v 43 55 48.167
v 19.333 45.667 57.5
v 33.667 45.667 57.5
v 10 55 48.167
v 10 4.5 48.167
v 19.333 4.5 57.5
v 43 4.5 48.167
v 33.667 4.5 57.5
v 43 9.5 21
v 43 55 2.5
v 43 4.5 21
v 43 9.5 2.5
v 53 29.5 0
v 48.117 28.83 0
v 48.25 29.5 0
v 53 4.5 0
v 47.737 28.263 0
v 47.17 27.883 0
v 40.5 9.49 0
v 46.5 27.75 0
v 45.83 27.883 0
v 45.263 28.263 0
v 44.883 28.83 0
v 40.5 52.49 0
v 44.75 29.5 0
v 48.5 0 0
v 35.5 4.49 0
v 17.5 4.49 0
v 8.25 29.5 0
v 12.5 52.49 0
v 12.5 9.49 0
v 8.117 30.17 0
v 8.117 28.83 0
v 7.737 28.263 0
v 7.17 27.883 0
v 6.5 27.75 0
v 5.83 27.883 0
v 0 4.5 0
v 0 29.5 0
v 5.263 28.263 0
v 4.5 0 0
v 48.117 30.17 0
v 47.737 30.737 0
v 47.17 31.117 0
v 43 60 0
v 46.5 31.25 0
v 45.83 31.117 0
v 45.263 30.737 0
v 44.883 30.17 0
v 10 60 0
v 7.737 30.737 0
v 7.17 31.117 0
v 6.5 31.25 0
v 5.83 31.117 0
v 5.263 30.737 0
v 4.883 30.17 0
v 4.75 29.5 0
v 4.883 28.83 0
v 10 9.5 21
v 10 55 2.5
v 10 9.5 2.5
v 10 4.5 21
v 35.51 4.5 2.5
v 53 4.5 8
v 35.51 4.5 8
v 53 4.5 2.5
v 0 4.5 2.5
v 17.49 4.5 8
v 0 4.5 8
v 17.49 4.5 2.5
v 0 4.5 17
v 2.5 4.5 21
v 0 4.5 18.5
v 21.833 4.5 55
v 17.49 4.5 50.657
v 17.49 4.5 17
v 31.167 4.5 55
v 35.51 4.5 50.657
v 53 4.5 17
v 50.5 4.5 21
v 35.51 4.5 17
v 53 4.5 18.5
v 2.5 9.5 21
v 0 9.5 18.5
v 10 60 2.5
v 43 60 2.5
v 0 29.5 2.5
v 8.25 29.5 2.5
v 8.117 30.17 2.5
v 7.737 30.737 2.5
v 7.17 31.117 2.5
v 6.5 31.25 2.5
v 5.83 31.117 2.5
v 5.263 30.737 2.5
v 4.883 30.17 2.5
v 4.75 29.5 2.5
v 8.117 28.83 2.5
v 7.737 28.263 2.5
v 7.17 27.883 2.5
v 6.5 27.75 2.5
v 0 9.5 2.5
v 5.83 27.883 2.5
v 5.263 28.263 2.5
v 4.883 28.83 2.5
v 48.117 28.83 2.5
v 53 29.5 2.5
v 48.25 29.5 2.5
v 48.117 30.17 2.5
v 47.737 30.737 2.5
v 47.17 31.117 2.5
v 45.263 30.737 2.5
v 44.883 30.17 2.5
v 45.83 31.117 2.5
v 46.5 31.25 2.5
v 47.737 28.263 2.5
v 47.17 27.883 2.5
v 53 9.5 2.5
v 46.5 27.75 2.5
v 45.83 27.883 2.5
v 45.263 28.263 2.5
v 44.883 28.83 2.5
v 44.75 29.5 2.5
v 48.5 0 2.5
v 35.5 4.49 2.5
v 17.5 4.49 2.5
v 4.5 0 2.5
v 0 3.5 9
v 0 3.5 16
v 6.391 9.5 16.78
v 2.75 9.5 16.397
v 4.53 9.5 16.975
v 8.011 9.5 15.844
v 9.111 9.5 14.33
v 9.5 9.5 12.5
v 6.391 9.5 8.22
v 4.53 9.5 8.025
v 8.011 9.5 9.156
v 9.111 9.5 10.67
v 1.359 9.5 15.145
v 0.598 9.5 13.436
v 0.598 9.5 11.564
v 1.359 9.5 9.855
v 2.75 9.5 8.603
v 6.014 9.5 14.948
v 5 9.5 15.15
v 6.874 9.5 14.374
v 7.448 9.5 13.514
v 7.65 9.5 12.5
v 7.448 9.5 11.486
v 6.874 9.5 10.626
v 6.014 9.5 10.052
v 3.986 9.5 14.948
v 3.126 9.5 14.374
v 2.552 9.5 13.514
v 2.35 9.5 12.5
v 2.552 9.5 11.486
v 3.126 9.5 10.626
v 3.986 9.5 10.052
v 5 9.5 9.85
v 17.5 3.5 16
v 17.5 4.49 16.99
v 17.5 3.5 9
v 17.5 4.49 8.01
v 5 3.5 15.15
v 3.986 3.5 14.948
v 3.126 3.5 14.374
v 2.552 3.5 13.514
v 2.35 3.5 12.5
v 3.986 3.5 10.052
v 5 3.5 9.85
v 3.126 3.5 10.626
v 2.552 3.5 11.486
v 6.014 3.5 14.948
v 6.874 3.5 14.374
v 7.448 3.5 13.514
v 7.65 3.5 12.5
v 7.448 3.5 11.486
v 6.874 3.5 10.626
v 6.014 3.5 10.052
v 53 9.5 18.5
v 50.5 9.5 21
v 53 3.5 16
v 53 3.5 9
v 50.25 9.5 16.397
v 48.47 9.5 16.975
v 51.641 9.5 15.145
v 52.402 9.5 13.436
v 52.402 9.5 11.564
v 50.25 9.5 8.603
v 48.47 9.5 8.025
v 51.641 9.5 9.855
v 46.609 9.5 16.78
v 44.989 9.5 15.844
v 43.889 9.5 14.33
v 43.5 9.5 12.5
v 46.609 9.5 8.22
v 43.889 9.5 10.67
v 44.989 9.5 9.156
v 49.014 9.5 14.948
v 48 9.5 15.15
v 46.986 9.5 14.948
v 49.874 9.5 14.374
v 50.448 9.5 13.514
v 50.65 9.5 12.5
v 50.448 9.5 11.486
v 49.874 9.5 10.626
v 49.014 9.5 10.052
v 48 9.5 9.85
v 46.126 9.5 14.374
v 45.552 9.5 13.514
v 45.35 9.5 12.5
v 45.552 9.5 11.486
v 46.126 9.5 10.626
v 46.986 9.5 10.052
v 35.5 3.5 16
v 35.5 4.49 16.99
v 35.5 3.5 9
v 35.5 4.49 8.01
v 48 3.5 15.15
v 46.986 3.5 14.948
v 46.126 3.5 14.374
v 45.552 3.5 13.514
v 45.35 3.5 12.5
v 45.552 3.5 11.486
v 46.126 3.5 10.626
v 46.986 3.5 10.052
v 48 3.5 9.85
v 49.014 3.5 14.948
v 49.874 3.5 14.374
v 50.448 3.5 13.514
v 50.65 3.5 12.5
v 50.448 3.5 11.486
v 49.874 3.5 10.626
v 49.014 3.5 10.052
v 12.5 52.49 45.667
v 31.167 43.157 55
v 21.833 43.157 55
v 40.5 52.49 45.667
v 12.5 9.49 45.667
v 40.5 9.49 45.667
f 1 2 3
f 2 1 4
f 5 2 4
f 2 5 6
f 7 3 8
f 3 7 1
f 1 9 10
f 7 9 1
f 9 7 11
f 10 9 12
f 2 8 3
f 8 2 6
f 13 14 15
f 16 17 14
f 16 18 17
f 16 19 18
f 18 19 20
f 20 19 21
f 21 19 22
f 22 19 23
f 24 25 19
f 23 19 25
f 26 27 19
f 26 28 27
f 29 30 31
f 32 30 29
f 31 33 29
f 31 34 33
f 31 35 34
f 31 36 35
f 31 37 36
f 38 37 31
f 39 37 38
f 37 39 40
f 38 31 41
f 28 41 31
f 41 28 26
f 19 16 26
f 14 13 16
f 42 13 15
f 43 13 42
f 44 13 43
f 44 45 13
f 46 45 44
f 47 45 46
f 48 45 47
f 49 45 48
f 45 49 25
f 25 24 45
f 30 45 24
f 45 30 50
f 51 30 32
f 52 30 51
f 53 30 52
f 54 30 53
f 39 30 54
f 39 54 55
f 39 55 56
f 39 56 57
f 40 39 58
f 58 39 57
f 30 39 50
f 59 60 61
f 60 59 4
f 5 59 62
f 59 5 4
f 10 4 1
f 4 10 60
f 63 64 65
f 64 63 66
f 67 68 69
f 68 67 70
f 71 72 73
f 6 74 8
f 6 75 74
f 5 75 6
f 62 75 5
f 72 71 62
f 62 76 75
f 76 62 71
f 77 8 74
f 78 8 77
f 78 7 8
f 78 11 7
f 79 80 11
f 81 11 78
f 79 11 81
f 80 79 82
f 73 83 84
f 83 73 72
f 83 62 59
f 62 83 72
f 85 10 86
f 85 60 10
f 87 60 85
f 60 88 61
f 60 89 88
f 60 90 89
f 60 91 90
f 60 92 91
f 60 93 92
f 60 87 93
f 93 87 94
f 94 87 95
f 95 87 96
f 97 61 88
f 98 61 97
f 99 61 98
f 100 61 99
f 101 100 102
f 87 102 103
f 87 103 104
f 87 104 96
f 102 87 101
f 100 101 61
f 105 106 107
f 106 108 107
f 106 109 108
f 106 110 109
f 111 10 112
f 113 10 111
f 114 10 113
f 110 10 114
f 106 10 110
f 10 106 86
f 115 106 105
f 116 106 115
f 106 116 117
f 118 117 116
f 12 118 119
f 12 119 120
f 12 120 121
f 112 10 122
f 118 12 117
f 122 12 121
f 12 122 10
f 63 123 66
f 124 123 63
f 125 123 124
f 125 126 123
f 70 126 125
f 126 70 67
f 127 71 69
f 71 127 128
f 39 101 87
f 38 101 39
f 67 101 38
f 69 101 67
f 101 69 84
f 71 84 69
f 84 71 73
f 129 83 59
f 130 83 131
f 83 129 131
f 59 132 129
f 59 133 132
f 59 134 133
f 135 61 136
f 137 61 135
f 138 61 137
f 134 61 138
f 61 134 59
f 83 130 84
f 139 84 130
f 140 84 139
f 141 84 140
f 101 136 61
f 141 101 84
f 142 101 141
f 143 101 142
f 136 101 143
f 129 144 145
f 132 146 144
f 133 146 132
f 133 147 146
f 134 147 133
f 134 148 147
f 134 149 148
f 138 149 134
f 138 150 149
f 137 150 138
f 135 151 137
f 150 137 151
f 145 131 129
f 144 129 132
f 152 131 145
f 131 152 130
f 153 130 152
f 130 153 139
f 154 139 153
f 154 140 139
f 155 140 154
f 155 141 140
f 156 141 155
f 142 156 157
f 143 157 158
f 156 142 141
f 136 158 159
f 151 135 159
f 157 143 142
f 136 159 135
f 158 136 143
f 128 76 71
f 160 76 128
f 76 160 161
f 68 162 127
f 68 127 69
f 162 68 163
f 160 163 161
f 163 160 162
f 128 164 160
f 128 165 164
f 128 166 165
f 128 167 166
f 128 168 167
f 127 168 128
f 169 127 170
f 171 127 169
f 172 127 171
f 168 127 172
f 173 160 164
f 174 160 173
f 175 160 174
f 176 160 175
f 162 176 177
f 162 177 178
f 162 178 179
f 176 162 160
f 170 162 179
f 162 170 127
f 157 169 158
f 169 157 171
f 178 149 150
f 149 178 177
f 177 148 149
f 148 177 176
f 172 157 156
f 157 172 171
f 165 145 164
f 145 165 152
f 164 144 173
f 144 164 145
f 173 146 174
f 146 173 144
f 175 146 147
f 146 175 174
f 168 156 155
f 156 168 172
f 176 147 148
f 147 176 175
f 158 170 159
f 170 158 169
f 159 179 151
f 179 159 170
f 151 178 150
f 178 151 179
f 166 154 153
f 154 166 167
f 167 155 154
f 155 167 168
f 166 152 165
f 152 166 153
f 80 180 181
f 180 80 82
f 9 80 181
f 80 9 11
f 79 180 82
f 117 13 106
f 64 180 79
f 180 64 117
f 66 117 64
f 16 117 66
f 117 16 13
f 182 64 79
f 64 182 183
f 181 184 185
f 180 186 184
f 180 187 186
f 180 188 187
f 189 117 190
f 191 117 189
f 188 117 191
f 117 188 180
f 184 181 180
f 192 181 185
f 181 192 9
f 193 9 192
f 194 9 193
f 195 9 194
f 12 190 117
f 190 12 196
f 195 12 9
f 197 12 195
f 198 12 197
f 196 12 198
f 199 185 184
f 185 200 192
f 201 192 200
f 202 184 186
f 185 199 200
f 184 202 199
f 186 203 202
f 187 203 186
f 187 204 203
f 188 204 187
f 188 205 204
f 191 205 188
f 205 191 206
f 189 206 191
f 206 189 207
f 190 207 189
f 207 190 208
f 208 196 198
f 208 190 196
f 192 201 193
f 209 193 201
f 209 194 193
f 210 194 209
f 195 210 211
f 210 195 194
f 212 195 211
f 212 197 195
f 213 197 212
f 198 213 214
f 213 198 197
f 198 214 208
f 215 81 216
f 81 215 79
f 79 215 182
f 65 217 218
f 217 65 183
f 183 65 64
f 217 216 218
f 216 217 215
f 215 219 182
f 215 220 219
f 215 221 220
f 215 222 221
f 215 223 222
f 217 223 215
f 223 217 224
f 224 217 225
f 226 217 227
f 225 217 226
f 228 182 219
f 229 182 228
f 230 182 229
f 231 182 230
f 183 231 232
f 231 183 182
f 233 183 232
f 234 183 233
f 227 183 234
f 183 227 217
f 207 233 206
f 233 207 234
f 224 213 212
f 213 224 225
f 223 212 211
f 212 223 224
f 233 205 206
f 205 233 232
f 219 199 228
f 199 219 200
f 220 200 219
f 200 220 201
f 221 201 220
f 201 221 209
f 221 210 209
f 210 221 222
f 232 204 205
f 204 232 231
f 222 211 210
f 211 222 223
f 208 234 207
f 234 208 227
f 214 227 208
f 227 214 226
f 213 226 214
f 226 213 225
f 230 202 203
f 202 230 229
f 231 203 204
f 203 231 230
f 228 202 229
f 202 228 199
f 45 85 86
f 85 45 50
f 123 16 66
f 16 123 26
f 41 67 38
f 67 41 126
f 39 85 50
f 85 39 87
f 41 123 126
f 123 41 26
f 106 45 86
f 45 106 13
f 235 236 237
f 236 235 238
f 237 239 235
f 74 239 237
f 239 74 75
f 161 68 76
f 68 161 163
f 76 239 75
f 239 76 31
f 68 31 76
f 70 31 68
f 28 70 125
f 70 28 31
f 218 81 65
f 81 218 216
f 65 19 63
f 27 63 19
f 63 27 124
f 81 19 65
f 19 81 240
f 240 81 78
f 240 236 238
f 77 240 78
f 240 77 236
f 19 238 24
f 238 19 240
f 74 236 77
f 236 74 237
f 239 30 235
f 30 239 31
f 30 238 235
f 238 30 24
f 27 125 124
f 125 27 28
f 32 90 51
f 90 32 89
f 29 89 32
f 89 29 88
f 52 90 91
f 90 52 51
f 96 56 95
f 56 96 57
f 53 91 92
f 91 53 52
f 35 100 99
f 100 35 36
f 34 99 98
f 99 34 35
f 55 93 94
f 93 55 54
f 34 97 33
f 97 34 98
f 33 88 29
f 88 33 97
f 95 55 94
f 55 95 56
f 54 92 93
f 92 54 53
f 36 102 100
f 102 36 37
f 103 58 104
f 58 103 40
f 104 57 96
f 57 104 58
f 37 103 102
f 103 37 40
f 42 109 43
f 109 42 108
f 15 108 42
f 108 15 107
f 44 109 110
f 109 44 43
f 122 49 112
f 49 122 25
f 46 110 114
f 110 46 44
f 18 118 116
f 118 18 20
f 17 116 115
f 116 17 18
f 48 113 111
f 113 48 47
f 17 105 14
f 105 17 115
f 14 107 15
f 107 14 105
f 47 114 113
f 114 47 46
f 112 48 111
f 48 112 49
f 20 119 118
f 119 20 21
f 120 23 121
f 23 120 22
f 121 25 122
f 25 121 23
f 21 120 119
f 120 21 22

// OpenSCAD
// preview[view:northeast, tilt:topdiagonal]

/* [Basic] */
// Thickness of walls
t=2.5;
// extra space behind the plug for wires
sock_ex_h=34;   

// Aluminum extrusion
ae=20;

// Placement of cutout for wires
mirror=0;

/* [Advanced] */
sock_w=28;
sock_d=48;
sock_h=21;
// extra faceplate on bottom
sock_ex_b=4.5;
// extra faceplate on top
sock_ex_t=7.5;
sock_fillet=5;

// Overall width
f_w=48+2*t;

/* [Hidden] */
f_d=sock_d+sock_ex_b+sock_ex_t;
f_corner=(f_w-sock_w-2*t)/2;

e=0.01;

power_plug();

module mount_screw() {
  // screw hole
  translate([0,0,-e]) cylinder(2*t+2*e, d=3.5, $fn=16);
  // nut clearout
  translate([0,0,t+e]) rotate(30) cylinder(sock_h+sock_ex_h+2*t+2*e, d=7, $fn=6);
}

module mount_ear() {
  w=f_corner;
  tt=5;
  
  difference() {
    union() {
      cube_fillet([w,tt,ae-t+1], top=[0,2.5]);
      translate([0,-1,(ae-9)/2])
        cube_fillet([w+sock_fillet+t,1,9], bottom=[0,0,1], top=[0,0,1]);
    }
    // M5 screw
    translate([w/2,0,ae/2]) rotate([-90]) {
      translate([0,0,-1-e]) cylinder(tt+1+2*e, d=5.3, $fn=16);
      // screw cap
      translate([0,0,5]) cylinder(tt-5+2*e, d=9);
    }
  }
}

module power_plug() {
difference() {
  union() {
    // faceplate
    linear_extrude(height=t) polygon([
      [0,sock_ex_b], [sock_ex_b,0], [f_w-sock_ex_b,0], [f_w,sock_ex_b],
      [f_w,sock_ex_b+25], [f_w-f_corner,f_d], [f_corner,f_d],
      [0,sock_ex_b+25]
    ]);
    // sock body
    translate([f_corner,sock_ex_b,0])
      cube_fillet([sock_w+2*t, sock_d+t, sock_h+sock_ex_h+t],
        top=[sock_w/3,sock_w/3,0,sock_w/3]);

    translate([0,sock_ex_b,t]) {
      // left mounting ear
      mount_ear();
      // right mounting ear
      translate([f_w,0,0]) mirror([1]) mount_ear();
    }
  }
  
  // begin difference
  // main socket hole
  if (mirror) {
    translate([(f_w-sock_w)/2,sock_d+sock_ex_b+e+t,-e])
      mirror([0,1,0]) cube_fillet([sock_w, sock_d, sock_h+sock_ex_h+e],
        vertical=[0,0,sock_fillet,sock_fillet], top=[sock_w/3,sock_w/3,0,sock_w/3]);
  } else {
    translate([(f_w-sock_w)/2,sock_ex_b-e,-e])
      cube_fillet([sock_w, sock_d, sock_h+sock_ex_h+e],
        vertical=[0,0,sock_fillet,sock_fillet], top=[sock_w/3,sock_w/3,0,sock_w/3]);
  }
  // screw holes
  translate([(f_w-40)/2,25+sock_ex_b,0]) {
    mount_screw();
    translate([40,0,0]) mount_screw();
  }

}
} /* end module power_plug */

/** END OF POWER_PLUG - BEGIN INCLUDES **/
module nut(d,h,horizontal=true){
    cornerdiameter =  (d / 2) / cos (180 / 6);
    cylinder(h = h, r = cornerdiameter, $fn = 6);
    if(horizontal){
        for(i = [1:6]){
            rotate([0,0,60*i]) translate([-cornerdiameter-0.2,0,0]) rotate([0,0,-45]) cube([2,2,h]);
        }
    }
}

module fillet(radius, height=100, $fn=$fn) {
  if (radius > 0) {
    //this creates acutal fillet
    translate([-radius, -radius, -height / 2 - 0.02]) difference() {
        cube([radius * 2, radius * 2, height + 0.04]);
        if ($fn == 0 && (radius == 2 || radius == 3 || radius == 4)) {
            cylinder(r=radius, h=height + 0.04, $fn=4 * radius);
        } else {
            cylinder(r=radius, h=height + 0.04, $fn=$fn);
        }

    }
  }
}

module cube_fillet(size, radius=-1, vertical=[0,0,0,0], top=[0,0,0,0], bottom=[0,0,0,0], center=false, $fn=4){
    if (center) {
        cube_fillet_inside(size, radius, vertical, top, bottom, $fn);
    } else {
        translate([size[0]/2, size[1]/2, size[2]/2])
            cube_fillet_inside(size, radius, vertical, top, bottom, $fn);
    }
}

module cube_negative_fillet(size, radius=-1, vertical=[3,3,3,3], top=[0,0,0,0], bottom=[0,0,0,0], $fn=$fn){
    j=[1,0,1,0];

    for (i=[0:3]) {
        if (radius > -1) {
            rotate([0, 0, 90*i]) translate([size[1-j[i]]/2, size[j[i]]/2, 0]) fillet(radius, size[2], $fn);
        } else {
            rotate([0, 0, 90*i]) translate([size[1-j[i]]/2, size[j[i]]/2, 0]) fillet(vertical[i], size[2], $fn);
        }
        rotate([90*i, -90, 0]) translate([size[2]/2, size[j[i]]/2, 0 ]) fillet(top[i], size[1-j[i]], $fn);
        rotate([90*(4-i), 90, 0]) translate([size[2]/2, size[j[i]]/2, 0]) fillet(bottom[i], size[1-j[i]], $fn);

    }
}

module cube_fillet_inside(size, radius=-1, vertical=[3,3,3,3], top=[0,0,0,0], bottom=[0,0,0,0], $fn=$fn){
    //makes CENTERED cube with round corners
    // if you give it radius, it will fillet vertical corners.
    //othervise use vertical, top, bottom arrays
    //when viewed from top, it starts in upper right corner (+x,+y quadrant) , goes counterclockwise
    //top/bottom fillet starts in direction of Y axis and goes CCW too

    if (radius == 0) {
        cube(size, center=true);
    } else {
        difference() {
            cube(size, center=true);
            cube_negative_fillet(size, radius, vertical, top, bottom, $fn);
        }
    }
}
